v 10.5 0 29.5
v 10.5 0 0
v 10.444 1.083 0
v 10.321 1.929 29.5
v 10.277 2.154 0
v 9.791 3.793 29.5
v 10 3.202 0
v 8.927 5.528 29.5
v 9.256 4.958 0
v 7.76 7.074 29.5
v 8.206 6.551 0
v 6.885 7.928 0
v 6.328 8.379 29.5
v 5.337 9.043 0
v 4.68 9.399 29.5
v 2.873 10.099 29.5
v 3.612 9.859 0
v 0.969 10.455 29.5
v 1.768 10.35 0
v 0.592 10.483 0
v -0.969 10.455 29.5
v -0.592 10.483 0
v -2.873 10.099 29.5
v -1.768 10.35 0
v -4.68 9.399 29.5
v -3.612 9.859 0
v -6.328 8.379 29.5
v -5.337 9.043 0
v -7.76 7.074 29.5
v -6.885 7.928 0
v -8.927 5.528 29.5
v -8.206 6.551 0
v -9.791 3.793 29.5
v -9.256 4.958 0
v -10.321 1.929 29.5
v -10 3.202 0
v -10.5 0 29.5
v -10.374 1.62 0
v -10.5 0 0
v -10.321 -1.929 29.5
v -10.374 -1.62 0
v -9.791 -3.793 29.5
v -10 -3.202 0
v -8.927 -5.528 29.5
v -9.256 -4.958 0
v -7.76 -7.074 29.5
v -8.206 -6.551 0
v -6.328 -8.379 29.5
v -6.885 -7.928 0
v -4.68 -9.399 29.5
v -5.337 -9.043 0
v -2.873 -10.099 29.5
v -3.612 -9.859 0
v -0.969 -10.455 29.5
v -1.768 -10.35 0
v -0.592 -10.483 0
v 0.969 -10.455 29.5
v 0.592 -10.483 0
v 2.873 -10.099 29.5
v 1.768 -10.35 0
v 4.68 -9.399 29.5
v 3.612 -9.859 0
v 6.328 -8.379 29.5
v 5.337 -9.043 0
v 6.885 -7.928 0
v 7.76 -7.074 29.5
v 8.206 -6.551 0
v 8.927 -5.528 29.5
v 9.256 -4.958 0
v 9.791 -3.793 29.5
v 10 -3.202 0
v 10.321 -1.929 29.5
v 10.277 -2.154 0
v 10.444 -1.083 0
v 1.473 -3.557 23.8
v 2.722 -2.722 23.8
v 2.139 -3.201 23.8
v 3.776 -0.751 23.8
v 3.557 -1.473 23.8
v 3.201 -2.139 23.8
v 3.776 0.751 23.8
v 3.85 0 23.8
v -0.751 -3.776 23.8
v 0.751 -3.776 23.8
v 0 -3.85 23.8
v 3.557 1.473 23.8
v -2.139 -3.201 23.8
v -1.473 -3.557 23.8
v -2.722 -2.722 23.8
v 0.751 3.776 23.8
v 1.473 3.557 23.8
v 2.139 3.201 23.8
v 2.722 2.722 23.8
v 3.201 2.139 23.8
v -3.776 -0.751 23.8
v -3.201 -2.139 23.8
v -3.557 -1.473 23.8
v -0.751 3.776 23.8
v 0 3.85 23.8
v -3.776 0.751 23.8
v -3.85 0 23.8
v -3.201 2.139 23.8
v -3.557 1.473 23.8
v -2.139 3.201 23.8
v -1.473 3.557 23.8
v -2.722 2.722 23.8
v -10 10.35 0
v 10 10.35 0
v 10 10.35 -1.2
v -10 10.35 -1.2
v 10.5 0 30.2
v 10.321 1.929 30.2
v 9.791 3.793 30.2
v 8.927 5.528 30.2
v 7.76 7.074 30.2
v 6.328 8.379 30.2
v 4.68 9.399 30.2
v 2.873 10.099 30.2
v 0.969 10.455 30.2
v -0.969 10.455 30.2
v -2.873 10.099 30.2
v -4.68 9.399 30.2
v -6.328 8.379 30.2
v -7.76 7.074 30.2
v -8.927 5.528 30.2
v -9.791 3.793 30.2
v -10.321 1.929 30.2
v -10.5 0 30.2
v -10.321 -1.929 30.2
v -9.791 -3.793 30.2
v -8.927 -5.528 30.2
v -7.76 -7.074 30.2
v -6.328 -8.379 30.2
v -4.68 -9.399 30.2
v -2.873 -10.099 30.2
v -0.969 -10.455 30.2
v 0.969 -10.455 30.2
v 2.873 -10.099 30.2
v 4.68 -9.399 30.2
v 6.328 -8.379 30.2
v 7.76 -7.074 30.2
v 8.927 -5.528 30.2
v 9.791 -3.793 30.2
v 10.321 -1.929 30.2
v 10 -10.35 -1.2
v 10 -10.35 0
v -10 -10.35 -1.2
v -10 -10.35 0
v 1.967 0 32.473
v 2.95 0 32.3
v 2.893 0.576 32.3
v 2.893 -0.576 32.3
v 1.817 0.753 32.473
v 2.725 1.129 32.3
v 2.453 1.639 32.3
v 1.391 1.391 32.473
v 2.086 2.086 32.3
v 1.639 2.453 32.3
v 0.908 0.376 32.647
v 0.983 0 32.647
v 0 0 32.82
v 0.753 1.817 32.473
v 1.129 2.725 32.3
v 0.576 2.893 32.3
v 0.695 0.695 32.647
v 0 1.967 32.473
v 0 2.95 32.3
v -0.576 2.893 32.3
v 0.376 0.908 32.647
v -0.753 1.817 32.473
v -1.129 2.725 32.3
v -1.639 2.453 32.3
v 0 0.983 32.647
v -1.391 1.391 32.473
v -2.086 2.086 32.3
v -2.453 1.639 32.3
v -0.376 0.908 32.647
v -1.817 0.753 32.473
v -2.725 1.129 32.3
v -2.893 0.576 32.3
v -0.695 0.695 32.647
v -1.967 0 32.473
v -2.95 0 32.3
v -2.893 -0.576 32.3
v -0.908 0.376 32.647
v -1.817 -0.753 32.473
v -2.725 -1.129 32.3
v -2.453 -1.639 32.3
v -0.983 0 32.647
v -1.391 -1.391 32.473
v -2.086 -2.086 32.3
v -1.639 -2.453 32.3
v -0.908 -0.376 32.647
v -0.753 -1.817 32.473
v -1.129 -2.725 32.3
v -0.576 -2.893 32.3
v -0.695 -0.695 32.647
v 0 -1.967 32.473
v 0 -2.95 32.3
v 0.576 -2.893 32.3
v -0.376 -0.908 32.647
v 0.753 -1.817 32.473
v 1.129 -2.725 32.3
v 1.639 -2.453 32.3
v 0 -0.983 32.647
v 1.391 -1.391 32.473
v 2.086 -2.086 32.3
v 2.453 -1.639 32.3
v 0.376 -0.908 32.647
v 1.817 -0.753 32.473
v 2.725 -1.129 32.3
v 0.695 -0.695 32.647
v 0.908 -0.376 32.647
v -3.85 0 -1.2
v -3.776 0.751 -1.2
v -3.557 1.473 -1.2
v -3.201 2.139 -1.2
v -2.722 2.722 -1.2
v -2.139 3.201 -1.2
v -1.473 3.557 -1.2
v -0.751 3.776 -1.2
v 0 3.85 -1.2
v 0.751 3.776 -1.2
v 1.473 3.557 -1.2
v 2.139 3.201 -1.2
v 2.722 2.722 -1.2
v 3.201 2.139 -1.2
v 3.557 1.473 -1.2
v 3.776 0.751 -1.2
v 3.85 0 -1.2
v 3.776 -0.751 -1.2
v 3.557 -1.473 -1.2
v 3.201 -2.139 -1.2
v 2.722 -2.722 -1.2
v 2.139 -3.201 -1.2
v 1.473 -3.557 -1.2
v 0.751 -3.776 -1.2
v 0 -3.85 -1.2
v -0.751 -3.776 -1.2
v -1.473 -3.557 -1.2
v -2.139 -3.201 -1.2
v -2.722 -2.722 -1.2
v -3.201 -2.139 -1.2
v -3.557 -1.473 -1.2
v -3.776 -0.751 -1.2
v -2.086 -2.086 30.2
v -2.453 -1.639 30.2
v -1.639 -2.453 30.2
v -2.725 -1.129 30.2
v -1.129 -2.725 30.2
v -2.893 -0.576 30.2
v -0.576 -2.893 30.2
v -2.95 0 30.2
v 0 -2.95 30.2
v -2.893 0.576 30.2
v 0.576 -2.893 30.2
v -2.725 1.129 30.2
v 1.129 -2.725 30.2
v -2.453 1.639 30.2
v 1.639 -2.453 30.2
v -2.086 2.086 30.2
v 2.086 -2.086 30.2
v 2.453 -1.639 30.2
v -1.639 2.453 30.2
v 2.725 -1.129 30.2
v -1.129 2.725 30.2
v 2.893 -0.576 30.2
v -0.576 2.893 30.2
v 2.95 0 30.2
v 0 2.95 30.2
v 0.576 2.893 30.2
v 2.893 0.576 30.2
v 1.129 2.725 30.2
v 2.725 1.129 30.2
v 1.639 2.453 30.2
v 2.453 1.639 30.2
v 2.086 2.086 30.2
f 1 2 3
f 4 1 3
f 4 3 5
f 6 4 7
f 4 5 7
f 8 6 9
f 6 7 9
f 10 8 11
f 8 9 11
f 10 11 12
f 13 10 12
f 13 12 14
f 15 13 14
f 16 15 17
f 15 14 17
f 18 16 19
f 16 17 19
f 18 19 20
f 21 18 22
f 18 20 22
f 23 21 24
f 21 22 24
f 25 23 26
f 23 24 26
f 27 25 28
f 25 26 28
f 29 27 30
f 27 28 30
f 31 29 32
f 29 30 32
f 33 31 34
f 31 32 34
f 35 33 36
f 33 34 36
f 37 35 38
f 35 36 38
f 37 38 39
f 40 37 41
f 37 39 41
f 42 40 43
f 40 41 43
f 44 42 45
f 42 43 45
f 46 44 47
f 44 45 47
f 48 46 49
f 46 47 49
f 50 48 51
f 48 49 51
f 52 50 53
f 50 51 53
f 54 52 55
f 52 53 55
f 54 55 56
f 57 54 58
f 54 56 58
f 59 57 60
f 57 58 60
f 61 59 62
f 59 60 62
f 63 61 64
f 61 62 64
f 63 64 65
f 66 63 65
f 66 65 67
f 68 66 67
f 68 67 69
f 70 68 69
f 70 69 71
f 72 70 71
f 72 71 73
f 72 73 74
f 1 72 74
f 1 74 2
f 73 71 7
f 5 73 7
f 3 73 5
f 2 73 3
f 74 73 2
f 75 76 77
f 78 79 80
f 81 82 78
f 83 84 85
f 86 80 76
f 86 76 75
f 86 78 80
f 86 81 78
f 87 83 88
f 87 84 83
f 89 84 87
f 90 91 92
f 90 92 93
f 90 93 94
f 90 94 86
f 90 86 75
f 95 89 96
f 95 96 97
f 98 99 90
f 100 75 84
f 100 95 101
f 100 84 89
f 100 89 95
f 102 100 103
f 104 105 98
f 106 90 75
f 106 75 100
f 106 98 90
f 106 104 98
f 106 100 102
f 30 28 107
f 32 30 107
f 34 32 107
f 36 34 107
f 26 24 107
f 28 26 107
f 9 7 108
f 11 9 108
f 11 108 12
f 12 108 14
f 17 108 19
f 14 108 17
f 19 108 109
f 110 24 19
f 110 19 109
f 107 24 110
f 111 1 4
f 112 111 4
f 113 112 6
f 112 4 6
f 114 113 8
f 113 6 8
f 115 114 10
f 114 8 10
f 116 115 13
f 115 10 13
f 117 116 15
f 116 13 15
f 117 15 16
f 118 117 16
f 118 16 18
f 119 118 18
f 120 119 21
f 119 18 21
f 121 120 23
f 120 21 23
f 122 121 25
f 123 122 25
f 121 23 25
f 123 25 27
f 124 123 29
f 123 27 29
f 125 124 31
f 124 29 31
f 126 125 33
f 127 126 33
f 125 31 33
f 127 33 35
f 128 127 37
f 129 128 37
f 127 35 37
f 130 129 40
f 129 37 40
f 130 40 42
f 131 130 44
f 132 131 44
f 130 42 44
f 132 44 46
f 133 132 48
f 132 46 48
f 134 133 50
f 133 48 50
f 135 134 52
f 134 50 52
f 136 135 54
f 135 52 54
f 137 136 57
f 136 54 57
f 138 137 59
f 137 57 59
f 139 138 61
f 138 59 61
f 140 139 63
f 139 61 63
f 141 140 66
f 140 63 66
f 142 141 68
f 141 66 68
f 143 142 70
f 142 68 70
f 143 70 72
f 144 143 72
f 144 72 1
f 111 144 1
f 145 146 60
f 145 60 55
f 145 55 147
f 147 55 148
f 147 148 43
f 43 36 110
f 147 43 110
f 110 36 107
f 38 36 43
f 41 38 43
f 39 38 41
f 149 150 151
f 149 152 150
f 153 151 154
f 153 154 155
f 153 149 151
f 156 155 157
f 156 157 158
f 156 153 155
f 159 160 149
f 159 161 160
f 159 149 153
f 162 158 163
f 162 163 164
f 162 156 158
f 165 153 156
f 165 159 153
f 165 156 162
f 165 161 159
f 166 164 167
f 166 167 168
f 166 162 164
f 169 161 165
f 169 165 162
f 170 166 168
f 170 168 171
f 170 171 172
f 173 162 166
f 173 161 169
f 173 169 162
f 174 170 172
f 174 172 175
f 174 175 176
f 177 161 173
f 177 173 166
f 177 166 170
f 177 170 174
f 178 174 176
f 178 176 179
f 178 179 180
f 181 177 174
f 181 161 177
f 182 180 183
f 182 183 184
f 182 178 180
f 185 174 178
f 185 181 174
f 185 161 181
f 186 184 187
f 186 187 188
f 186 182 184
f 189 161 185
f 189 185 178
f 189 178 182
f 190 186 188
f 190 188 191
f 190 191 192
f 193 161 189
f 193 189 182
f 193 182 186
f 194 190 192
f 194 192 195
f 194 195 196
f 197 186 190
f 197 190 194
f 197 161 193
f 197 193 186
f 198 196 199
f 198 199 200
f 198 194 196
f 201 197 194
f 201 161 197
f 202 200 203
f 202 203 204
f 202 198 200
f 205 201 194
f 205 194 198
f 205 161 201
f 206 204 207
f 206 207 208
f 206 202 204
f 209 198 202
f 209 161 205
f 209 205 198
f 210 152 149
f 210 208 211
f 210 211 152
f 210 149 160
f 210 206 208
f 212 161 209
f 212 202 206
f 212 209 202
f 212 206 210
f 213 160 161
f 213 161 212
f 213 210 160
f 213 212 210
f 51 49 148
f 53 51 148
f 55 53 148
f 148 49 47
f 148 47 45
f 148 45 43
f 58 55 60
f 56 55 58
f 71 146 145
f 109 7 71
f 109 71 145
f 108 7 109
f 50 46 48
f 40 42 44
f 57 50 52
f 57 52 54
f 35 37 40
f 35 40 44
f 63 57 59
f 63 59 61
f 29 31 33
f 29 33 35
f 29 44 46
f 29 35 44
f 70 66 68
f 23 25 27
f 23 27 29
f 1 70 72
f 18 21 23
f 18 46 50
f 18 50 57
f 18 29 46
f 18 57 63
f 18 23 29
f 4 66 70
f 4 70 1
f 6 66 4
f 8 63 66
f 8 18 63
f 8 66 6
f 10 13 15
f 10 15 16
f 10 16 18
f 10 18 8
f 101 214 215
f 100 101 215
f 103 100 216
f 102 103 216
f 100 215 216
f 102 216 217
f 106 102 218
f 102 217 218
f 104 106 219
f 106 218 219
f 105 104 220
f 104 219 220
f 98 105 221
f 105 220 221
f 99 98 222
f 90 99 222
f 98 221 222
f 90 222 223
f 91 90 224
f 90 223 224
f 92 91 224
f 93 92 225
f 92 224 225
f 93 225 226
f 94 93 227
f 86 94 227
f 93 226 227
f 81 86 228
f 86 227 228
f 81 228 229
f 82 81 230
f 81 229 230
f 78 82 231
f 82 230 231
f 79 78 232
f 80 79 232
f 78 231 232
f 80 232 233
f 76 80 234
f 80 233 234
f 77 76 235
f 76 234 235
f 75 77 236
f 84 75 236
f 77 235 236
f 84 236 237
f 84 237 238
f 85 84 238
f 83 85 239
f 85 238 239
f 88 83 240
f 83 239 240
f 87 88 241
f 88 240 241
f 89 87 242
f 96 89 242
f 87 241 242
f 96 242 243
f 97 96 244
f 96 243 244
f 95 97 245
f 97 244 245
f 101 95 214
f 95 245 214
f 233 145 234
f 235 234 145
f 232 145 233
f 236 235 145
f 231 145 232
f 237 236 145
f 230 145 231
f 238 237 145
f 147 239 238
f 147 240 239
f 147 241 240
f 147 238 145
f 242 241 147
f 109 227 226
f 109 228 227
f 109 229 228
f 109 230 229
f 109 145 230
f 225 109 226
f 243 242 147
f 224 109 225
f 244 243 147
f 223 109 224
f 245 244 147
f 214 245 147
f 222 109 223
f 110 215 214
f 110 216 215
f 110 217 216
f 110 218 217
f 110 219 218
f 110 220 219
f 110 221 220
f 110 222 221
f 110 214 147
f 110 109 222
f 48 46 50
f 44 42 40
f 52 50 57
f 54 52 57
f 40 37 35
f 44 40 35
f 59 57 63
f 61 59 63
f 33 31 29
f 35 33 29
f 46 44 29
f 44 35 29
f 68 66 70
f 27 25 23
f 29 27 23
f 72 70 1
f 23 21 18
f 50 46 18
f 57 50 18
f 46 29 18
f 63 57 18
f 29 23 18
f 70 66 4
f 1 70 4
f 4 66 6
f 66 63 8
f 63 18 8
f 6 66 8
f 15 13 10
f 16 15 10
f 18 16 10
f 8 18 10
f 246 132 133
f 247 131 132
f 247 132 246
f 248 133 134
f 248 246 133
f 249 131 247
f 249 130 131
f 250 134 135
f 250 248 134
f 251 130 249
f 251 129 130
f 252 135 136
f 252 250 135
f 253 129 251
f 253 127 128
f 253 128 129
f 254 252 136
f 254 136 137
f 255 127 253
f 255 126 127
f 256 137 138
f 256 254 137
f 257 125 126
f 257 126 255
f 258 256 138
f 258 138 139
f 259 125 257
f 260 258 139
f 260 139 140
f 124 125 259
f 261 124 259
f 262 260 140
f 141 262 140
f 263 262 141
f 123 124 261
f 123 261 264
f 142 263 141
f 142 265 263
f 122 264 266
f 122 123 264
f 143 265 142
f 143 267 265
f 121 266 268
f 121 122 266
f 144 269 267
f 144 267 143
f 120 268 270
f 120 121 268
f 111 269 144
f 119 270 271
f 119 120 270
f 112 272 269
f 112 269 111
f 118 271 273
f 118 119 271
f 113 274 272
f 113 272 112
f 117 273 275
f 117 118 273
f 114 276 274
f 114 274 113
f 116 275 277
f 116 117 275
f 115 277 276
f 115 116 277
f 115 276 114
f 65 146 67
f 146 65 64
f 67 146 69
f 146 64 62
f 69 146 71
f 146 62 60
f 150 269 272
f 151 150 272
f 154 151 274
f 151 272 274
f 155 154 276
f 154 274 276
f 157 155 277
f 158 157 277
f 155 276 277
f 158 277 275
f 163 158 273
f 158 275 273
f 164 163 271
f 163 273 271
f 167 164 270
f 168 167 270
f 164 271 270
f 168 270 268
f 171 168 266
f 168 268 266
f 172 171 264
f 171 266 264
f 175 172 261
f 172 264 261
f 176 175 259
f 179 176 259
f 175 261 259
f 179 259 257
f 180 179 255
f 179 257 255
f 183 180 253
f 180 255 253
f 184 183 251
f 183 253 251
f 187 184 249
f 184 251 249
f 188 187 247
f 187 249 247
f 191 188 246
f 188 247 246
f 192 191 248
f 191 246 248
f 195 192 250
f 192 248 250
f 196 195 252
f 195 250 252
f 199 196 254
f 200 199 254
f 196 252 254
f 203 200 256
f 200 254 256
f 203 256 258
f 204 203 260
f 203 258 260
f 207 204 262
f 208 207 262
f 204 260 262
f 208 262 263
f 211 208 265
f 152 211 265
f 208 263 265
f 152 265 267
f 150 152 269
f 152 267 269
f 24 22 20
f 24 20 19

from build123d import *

# Parameters (mm, degrees)
SKETCH1_R           = 10.5
BOSS_EXTRUDE1_DEPTH = 29.5
SKETCH2_R           = 10.5
BOSS_EXTRUDE2_DEPTH = 0.7
SKETCH3_W           = 20
SKETCH3_H           = 20.7
BOSS_EXTRUDE3_DEPTH = 1.2
SKETCH4_R           = 3.85
CUT_EXTRUDE1_DEPTH  = 25
SKETCH5_R           = 2.95
BOSS_EXTRUDE4_DEPTH = 2.1
SKETCH6_R           = 2.95
BOSS_EXTRUDE5_DEPTH = 10
BOSS_EXTRUDE5_TAPER = 80


with BuildPart() as part:
    # Sketch1 → Boss-Extrude1 (new body)
    with BuildSketch(Plane.XY):
        Circle(SKETCH1_R)
    extrude(amount=BOSS_EXTRUDE1_DEPTH)

    # Sketch3 → Boss-Extrude3 (add)
    with BuildSketch(Plane(origin=(0, 0, 0), x_dir=(-1, 0, 0), z_dir=(0, 0, -1))):
        Rectangle(SKETCH3_W, SKETCH3_H)
    extrude(amount=BOSS_EXTRUDE3_DEPTH)

    # Sketch4 → Cut-Extrude1 (cut)
    with BuildSketch(Plane(origin=(0, 0, -1.2), x_dir=(-1, 0, 0), z_dir=(0, 0, -1))):
        Circle(SKETCH4_R)
    extrude(amount=-CUT_EXTRUDE1_DEPTH, mode=Mode.SUBTRACT)


with BuildPart() as body_2:
    # Sketch2 → Boss-Extrude2 (new body)
    with BuildSketch(Plane.XY.offset(29.5)):
        Circle(SKETCH2_R)
    extrude(amount=BOSS_EXTRUDE2_DEPTH)

    # Sketch5 → Boss-Extrude4 (add)
    with BuildSketch(Plane.XY.offset(30.2)):
        Circle(SKETCH5_R)
    extrude(amount=BOSS_EXTRUDE4_DEPTH)

    # Sketch6 → Boss-Extrude5 (add)
    with BuildSketch(Plane.XY.offset(32.3)):
        Circle(SKETCH6_R)
    extrude(amount=BOSS_EXTRUDE5_DEPTH, taper=BOSS_EXTRUDE5_TAPER)


solid = Compound([part.part, body_2.part])
